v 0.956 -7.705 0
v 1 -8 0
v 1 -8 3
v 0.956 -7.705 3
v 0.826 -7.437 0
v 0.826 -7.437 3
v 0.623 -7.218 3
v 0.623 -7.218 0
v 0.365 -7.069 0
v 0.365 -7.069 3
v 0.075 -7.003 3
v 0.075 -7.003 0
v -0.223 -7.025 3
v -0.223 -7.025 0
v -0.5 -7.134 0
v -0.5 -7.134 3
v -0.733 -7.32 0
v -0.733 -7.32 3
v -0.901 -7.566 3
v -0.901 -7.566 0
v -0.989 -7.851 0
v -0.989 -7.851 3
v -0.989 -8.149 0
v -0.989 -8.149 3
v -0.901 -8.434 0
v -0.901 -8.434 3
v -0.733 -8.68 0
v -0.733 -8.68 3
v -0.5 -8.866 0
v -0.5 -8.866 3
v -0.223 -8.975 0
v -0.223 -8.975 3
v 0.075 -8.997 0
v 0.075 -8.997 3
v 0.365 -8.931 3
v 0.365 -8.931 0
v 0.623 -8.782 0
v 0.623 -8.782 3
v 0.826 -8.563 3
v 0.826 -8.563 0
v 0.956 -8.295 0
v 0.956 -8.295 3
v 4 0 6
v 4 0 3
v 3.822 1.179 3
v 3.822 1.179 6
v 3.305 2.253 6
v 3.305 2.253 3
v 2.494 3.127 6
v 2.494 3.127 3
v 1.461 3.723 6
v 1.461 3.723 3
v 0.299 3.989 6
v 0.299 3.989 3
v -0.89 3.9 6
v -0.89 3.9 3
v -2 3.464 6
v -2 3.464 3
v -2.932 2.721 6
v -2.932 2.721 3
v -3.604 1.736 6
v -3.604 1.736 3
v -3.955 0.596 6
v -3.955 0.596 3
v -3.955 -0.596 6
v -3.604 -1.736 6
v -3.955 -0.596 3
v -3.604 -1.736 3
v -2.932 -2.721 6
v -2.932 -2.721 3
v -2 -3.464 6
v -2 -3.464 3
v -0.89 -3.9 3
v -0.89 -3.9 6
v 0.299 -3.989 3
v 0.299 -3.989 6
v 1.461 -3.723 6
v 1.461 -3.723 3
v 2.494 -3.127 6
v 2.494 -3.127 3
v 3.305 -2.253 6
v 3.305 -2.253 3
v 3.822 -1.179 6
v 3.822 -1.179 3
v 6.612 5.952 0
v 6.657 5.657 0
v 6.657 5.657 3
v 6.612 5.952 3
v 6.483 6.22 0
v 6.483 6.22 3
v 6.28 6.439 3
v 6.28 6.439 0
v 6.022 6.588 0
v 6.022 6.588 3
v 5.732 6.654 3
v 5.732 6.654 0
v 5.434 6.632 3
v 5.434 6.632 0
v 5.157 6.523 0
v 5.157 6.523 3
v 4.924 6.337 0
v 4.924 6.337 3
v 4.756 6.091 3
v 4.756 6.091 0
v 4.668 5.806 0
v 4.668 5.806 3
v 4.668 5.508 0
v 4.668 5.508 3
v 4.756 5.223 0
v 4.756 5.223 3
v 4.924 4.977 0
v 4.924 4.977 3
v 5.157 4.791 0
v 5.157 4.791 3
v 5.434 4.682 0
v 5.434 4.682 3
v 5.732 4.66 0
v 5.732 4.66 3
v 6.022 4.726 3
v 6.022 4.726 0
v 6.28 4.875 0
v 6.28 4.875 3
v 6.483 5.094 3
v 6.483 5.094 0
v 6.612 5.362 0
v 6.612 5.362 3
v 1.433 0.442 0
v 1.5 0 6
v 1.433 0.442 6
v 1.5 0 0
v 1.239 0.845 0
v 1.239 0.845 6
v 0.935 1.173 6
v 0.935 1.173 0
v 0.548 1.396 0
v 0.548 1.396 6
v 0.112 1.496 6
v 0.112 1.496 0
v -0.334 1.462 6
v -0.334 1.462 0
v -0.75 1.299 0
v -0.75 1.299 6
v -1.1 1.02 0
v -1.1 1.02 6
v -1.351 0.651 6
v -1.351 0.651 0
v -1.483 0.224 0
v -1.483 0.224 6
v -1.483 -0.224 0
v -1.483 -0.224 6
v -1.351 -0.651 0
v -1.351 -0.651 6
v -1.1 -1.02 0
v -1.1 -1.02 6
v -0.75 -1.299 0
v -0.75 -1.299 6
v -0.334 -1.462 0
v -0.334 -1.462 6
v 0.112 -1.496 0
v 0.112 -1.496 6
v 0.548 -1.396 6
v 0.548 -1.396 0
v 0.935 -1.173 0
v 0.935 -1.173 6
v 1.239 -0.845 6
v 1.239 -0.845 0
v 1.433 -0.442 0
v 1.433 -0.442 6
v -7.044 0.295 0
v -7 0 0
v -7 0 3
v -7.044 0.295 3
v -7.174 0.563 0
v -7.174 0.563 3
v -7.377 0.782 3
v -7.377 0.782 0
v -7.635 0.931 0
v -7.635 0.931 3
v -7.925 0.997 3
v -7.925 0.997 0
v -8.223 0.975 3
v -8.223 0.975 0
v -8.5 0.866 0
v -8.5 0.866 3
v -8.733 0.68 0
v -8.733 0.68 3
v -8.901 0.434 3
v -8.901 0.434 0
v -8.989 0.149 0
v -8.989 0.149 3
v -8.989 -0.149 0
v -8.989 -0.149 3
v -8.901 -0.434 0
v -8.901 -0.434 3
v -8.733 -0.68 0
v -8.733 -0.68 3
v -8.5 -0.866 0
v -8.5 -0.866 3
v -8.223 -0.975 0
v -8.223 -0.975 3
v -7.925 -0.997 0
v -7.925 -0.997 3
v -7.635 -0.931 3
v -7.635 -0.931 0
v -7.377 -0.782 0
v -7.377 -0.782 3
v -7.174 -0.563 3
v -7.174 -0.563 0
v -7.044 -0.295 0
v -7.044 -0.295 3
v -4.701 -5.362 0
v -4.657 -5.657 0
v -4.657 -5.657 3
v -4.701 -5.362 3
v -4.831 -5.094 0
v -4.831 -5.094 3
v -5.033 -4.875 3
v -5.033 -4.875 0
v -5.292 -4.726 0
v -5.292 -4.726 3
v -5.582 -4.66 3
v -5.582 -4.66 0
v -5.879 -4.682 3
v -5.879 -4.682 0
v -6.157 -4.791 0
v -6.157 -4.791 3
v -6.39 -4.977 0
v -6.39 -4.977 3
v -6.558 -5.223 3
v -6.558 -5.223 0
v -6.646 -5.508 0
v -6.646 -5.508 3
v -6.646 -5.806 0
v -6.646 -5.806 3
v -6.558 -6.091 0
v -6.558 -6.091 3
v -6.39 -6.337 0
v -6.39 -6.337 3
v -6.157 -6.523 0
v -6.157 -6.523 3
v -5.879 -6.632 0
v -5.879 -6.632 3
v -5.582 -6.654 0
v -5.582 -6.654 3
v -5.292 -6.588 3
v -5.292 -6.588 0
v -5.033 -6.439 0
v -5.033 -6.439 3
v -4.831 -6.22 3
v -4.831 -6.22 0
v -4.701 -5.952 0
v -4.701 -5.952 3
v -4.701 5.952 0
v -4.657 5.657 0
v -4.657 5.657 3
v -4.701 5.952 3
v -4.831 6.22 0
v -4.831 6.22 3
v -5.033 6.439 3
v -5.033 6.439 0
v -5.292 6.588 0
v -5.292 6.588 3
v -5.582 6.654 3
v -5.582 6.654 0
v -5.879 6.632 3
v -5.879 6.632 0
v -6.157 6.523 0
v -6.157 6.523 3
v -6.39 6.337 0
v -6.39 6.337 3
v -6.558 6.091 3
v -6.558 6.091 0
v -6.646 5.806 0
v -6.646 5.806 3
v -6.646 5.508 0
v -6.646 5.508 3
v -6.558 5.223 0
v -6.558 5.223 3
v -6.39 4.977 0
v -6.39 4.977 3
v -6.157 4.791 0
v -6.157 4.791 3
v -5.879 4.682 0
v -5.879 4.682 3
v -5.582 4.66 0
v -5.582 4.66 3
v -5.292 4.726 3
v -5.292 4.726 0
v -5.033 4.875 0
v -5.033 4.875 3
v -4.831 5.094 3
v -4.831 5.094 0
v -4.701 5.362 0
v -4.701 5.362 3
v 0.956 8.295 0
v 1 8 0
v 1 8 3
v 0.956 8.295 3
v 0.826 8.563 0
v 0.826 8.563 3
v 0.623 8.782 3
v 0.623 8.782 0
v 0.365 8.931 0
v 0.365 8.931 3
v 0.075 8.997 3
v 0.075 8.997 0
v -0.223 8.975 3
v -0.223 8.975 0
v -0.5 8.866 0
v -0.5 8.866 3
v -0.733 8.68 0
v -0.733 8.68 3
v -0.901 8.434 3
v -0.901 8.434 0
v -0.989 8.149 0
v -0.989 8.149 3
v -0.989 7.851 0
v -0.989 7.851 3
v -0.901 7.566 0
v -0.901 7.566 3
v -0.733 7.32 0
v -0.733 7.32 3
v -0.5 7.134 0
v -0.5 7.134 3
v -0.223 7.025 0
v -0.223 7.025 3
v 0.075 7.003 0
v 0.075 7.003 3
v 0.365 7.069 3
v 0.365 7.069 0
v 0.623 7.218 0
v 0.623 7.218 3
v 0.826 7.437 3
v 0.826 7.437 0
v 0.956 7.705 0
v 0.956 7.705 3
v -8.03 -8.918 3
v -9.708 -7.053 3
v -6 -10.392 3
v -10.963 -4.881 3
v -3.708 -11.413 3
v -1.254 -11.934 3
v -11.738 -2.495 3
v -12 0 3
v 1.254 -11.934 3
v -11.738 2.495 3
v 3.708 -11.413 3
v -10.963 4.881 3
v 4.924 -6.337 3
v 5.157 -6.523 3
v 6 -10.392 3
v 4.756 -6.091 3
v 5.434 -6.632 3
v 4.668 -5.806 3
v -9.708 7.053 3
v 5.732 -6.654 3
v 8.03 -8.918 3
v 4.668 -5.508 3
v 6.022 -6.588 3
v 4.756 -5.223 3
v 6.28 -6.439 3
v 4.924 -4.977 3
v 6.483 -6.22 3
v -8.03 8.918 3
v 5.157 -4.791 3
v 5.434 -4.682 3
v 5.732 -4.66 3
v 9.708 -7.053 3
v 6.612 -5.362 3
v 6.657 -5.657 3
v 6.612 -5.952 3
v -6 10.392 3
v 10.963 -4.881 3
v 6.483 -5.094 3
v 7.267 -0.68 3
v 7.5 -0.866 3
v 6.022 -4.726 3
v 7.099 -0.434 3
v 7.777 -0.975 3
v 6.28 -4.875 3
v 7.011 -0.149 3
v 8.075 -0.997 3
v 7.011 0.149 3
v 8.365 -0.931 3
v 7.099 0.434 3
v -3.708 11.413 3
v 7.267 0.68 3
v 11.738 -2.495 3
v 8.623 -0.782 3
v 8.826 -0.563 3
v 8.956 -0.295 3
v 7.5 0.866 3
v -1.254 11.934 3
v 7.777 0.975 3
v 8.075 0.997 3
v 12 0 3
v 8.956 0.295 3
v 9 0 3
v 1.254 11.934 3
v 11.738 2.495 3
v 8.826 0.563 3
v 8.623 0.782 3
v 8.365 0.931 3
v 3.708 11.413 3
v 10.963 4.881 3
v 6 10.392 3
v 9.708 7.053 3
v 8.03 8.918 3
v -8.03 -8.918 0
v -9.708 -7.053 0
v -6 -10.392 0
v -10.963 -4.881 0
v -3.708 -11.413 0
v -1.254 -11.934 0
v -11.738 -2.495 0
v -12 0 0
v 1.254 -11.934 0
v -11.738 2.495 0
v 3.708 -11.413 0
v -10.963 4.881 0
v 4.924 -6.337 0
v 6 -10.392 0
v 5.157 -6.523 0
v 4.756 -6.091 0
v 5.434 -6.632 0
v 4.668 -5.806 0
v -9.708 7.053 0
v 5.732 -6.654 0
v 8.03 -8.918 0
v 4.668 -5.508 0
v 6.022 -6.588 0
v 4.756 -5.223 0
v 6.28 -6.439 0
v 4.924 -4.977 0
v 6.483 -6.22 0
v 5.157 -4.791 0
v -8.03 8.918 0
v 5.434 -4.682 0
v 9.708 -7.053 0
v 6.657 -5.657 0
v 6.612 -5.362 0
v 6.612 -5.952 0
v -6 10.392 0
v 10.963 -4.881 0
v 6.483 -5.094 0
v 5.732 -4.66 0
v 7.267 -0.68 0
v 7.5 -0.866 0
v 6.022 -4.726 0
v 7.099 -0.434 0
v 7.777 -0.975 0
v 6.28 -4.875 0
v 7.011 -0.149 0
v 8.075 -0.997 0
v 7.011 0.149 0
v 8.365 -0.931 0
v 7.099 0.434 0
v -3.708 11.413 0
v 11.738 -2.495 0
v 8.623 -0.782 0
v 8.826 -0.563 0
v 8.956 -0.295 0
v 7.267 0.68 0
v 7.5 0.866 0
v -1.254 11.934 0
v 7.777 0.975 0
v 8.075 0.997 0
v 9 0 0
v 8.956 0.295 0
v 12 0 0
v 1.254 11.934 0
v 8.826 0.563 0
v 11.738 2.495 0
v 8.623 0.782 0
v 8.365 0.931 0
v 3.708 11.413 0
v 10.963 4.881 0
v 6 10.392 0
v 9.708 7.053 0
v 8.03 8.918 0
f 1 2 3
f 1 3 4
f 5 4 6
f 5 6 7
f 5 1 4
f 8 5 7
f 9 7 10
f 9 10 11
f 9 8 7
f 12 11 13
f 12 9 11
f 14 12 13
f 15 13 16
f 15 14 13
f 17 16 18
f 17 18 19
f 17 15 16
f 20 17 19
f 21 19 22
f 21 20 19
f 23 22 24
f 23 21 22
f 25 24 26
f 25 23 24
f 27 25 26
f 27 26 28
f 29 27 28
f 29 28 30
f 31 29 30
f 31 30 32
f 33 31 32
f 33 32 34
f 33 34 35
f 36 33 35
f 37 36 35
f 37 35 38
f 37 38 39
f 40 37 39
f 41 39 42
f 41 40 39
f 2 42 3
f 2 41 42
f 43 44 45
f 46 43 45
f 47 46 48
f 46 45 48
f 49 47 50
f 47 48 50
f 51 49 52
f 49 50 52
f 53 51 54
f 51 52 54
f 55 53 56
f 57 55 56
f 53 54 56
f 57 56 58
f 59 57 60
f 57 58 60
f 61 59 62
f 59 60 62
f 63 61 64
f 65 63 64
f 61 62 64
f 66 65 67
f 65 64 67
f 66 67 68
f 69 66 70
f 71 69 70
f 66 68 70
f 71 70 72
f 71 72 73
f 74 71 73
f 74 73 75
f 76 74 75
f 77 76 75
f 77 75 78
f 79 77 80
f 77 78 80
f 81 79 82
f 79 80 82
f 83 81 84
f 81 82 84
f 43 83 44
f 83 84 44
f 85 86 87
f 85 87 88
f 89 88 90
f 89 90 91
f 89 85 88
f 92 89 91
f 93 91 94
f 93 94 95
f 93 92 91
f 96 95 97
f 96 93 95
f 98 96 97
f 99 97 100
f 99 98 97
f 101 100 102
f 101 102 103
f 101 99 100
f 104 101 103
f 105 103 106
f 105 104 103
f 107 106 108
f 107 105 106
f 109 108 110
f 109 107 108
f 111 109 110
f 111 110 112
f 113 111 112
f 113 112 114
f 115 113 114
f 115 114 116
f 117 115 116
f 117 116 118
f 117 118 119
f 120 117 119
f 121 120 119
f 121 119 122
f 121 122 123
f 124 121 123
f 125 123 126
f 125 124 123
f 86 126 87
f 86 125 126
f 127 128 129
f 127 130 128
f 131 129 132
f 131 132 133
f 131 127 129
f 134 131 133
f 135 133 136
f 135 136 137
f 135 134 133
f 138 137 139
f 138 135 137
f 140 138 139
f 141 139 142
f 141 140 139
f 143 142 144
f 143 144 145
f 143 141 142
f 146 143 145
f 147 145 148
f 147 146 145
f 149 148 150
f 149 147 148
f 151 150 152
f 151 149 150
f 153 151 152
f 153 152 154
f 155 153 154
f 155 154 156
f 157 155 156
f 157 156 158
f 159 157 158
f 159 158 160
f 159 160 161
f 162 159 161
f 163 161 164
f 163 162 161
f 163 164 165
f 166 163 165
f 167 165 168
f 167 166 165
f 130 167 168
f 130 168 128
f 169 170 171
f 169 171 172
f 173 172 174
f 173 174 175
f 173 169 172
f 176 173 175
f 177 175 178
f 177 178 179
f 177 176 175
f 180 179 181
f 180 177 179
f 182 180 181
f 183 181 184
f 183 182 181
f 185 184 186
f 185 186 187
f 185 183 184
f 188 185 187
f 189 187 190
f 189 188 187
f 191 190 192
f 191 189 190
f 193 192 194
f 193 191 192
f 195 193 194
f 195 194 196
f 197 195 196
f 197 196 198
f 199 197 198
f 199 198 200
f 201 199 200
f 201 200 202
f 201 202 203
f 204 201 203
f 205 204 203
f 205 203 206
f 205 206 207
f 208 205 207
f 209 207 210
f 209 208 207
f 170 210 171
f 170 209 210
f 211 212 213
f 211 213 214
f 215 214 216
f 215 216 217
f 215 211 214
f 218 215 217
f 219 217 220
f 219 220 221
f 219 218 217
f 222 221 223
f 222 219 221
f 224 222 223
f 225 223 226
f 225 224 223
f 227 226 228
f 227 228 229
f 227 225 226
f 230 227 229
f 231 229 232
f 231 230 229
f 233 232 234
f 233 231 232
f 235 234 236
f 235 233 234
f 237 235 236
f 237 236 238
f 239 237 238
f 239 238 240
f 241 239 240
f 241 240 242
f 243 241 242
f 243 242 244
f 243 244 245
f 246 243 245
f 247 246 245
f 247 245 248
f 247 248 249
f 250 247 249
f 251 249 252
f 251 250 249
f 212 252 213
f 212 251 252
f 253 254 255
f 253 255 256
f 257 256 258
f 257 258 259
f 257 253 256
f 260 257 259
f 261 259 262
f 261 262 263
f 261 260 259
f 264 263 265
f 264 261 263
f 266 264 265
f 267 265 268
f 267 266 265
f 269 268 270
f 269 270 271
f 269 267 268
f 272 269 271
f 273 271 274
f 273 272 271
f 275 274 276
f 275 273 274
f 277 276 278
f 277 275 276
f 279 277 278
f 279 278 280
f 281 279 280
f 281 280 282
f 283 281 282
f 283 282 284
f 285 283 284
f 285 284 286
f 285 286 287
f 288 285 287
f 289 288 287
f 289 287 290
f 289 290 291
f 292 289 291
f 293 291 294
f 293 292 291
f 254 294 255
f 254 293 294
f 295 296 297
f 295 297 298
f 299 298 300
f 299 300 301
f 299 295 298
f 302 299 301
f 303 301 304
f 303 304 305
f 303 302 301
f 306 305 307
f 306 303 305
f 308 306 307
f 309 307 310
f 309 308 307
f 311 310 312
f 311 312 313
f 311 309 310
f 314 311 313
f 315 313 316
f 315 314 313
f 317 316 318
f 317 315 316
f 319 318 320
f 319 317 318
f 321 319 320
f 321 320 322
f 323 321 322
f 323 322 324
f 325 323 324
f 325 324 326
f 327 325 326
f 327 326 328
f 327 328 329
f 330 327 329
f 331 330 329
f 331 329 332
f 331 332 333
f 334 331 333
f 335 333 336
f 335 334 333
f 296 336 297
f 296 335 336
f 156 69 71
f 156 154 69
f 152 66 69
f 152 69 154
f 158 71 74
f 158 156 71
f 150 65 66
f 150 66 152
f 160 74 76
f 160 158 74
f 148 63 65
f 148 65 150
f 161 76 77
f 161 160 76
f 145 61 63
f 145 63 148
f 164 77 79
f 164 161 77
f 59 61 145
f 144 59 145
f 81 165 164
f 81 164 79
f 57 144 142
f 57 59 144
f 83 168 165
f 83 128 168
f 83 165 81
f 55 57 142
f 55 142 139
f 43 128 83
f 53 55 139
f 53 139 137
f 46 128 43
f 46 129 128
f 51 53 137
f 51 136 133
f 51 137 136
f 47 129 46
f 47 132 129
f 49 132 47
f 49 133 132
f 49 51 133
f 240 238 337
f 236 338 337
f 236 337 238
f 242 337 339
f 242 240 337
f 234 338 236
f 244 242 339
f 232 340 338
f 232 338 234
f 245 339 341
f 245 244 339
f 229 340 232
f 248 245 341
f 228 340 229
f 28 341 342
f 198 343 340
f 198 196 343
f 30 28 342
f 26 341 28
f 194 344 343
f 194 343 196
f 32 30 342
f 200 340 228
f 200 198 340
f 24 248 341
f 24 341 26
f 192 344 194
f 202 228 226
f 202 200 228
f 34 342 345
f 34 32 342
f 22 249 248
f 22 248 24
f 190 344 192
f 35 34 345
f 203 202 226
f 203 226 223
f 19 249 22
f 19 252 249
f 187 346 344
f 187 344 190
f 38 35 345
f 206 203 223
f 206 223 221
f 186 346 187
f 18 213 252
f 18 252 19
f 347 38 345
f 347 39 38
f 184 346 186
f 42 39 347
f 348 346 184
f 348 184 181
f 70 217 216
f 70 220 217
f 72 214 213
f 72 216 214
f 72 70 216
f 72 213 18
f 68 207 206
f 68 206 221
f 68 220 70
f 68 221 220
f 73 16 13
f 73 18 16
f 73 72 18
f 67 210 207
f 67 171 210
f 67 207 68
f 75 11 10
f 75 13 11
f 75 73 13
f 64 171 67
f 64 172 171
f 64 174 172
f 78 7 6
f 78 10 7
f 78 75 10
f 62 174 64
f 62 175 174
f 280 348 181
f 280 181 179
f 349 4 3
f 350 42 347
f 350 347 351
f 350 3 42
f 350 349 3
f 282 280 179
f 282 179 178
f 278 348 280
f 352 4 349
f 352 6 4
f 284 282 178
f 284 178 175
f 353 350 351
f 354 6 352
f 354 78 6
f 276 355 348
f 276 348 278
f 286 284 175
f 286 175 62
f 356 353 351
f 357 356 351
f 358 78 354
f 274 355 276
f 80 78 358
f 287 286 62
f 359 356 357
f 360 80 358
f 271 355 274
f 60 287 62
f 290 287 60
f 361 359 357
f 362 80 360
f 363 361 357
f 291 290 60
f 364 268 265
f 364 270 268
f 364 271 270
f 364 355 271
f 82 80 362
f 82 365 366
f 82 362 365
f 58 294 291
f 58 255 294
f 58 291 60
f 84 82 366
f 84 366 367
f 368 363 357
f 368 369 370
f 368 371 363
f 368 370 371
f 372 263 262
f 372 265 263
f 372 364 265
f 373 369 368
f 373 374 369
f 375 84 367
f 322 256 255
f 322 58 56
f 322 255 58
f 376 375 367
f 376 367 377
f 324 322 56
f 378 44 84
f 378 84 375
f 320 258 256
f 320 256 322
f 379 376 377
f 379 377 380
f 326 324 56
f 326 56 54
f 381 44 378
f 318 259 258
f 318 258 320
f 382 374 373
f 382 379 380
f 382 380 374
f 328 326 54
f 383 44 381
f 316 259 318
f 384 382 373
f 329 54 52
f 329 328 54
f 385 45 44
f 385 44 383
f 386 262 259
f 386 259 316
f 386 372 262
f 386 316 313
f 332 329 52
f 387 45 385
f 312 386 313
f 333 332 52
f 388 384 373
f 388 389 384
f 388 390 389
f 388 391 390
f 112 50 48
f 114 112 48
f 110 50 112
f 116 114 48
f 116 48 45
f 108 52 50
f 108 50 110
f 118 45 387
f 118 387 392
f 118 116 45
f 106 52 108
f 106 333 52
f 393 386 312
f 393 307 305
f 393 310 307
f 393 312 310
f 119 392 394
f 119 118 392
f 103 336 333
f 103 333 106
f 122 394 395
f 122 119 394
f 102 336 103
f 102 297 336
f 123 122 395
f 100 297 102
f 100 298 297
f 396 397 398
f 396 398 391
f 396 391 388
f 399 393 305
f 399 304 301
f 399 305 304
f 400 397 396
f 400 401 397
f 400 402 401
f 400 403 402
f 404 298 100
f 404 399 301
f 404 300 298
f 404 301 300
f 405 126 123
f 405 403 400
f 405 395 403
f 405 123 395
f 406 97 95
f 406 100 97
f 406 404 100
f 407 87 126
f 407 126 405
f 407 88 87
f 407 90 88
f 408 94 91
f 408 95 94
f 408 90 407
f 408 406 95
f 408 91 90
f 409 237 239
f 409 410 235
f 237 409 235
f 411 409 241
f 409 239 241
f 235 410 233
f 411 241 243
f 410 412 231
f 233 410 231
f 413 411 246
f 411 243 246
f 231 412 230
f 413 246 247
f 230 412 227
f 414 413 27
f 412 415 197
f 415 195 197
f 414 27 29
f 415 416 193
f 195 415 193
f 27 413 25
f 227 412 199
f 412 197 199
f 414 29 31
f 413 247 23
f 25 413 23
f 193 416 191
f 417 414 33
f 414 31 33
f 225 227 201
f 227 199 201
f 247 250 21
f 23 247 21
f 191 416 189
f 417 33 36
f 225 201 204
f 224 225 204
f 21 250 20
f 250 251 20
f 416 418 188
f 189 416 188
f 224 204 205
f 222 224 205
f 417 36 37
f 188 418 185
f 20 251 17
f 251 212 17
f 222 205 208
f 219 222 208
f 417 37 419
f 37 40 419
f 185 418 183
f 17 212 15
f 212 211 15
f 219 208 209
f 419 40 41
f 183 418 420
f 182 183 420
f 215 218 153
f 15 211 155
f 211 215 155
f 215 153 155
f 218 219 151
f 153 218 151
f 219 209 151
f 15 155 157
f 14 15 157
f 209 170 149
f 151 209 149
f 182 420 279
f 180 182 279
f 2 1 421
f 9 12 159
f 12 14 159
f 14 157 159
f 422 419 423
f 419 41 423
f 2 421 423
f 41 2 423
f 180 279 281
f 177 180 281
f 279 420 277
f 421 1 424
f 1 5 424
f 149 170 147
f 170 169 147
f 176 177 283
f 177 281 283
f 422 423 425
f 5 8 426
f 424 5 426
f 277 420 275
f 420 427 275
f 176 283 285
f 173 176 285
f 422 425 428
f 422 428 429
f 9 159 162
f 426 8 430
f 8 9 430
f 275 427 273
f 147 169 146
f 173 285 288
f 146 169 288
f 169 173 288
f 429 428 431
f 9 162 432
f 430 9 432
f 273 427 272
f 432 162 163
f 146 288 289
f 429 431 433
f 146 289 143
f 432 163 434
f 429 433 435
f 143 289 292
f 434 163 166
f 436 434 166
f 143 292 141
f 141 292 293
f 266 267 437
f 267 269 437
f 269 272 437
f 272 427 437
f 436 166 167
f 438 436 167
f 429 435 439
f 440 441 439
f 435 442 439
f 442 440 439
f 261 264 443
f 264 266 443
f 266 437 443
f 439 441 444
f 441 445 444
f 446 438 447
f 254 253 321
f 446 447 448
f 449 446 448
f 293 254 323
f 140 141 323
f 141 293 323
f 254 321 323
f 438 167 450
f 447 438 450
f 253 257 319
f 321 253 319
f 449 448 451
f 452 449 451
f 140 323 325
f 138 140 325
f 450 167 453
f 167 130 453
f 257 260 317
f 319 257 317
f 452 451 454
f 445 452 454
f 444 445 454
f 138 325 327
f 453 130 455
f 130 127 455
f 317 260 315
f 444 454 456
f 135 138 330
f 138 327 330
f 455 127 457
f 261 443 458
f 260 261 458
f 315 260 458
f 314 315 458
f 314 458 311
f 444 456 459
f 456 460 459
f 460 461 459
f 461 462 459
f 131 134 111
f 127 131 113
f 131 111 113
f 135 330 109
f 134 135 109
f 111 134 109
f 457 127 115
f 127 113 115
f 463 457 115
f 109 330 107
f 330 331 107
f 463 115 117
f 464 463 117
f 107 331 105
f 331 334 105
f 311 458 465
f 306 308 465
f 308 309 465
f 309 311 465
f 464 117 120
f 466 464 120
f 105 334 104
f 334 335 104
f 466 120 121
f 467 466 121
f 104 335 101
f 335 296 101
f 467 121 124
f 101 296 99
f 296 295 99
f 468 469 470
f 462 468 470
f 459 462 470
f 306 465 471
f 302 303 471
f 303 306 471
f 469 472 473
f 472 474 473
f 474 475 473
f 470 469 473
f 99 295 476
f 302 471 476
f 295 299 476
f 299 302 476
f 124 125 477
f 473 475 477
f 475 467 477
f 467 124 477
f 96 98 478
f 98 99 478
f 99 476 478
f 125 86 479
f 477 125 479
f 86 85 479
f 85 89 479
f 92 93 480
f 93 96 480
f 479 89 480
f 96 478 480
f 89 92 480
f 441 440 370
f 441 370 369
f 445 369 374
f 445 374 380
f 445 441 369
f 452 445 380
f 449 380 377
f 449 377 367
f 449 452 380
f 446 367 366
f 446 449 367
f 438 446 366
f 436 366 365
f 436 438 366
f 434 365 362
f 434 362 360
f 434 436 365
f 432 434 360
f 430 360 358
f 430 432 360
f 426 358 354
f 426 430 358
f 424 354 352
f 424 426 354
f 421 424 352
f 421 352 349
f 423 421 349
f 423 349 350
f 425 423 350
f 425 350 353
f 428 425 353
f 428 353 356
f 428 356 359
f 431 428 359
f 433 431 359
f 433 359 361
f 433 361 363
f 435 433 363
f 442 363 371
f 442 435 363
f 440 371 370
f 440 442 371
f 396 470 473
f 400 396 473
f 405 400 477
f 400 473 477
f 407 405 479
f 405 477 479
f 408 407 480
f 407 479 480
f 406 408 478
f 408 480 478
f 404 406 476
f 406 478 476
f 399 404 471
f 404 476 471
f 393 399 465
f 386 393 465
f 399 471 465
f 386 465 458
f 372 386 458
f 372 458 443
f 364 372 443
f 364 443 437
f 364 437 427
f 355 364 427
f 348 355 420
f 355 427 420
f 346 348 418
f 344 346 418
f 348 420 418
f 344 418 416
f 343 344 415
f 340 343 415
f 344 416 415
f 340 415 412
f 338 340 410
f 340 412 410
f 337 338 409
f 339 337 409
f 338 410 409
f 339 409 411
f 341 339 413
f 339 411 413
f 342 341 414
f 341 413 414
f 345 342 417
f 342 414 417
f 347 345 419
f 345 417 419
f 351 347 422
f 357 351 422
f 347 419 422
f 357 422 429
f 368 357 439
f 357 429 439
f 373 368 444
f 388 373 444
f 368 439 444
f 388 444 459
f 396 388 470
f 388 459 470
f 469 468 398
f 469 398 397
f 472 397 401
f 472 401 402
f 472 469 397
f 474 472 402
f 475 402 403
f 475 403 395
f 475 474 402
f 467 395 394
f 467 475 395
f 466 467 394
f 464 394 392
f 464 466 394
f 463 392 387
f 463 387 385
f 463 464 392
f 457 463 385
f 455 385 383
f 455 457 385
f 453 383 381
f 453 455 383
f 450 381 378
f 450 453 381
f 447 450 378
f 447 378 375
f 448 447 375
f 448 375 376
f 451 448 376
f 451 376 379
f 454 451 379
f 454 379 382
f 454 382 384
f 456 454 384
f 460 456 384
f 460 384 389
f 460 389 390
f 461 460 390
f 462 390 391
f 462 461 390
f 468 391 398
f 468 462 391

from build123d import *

# Parameters (mm, degrees)
SKETCH_1_R      = 12
SKETCH_1_R_2    = 1
SKETCH_1_R_3    = 1.5
EXTRUDE_1_DEPTH = 3
SKETCH_2_R      = 4
SKETCH_2_R_2    = 1.5
EXTRUDE_2_DEPTH = 3


with BuildPart() as part:
    # 草图1 → 凸台-拉伸1 (new body)
    with BuildSketch(Plane.XY):
        Circle(SKETCH_1_R)
        with Locations((0, 8)):
            Circle(SKETCH_1_R_2, mode=Mode.SUBTRACT)
        with Locations((5.656854249, 5.656854249)):
            Circle(SKETCH_1_R_2, mode=Mode.SUBTRACT)
        with Locations((8, 0)):
            Circle(SKETCH_1_R_2, mode=Mode.SUBTRACT)
        with Locations((5.656854249, -5.656854249)):
            Circle(SKETCH_1_R_2, mode=Mode.SUBTRACT)
        with Locations((0, -8)):
            Circle(SKETCH_1_R_2, mode=Mode.SUBTRACT)
        with Locations((-5.656854249, -5.656854249)):
            Circle(SKETCH_1_R_2, mode=Mode.SUBTRACT)
        with Locations((-8, 0)):
            Circle(SKETCH_1_R_2, mode=Mode.SUBTRACT)
        with Locations((-5.656854249, 5.656854249)):
            Circle(SKETCH_1_R_2, mode=Mode.SUBTRACT)
        Circle(SKETCH_1_R_3, mode=Mode.SUBTRACT)
    extrude(amount=EXTRUDE_1_DEPTH)

    # 草图2 → 凸台-拉伸2 (add)
    with BuildSketch(Plane.XY.offset(3)):
        Circle(SKETCH_2_R)
        Circle(SKETCH_2_R_2, mode=Mode.SUBTRACT)
    extrude(amount=EXTRUDE_2_DEPTH)


solid = part.part
